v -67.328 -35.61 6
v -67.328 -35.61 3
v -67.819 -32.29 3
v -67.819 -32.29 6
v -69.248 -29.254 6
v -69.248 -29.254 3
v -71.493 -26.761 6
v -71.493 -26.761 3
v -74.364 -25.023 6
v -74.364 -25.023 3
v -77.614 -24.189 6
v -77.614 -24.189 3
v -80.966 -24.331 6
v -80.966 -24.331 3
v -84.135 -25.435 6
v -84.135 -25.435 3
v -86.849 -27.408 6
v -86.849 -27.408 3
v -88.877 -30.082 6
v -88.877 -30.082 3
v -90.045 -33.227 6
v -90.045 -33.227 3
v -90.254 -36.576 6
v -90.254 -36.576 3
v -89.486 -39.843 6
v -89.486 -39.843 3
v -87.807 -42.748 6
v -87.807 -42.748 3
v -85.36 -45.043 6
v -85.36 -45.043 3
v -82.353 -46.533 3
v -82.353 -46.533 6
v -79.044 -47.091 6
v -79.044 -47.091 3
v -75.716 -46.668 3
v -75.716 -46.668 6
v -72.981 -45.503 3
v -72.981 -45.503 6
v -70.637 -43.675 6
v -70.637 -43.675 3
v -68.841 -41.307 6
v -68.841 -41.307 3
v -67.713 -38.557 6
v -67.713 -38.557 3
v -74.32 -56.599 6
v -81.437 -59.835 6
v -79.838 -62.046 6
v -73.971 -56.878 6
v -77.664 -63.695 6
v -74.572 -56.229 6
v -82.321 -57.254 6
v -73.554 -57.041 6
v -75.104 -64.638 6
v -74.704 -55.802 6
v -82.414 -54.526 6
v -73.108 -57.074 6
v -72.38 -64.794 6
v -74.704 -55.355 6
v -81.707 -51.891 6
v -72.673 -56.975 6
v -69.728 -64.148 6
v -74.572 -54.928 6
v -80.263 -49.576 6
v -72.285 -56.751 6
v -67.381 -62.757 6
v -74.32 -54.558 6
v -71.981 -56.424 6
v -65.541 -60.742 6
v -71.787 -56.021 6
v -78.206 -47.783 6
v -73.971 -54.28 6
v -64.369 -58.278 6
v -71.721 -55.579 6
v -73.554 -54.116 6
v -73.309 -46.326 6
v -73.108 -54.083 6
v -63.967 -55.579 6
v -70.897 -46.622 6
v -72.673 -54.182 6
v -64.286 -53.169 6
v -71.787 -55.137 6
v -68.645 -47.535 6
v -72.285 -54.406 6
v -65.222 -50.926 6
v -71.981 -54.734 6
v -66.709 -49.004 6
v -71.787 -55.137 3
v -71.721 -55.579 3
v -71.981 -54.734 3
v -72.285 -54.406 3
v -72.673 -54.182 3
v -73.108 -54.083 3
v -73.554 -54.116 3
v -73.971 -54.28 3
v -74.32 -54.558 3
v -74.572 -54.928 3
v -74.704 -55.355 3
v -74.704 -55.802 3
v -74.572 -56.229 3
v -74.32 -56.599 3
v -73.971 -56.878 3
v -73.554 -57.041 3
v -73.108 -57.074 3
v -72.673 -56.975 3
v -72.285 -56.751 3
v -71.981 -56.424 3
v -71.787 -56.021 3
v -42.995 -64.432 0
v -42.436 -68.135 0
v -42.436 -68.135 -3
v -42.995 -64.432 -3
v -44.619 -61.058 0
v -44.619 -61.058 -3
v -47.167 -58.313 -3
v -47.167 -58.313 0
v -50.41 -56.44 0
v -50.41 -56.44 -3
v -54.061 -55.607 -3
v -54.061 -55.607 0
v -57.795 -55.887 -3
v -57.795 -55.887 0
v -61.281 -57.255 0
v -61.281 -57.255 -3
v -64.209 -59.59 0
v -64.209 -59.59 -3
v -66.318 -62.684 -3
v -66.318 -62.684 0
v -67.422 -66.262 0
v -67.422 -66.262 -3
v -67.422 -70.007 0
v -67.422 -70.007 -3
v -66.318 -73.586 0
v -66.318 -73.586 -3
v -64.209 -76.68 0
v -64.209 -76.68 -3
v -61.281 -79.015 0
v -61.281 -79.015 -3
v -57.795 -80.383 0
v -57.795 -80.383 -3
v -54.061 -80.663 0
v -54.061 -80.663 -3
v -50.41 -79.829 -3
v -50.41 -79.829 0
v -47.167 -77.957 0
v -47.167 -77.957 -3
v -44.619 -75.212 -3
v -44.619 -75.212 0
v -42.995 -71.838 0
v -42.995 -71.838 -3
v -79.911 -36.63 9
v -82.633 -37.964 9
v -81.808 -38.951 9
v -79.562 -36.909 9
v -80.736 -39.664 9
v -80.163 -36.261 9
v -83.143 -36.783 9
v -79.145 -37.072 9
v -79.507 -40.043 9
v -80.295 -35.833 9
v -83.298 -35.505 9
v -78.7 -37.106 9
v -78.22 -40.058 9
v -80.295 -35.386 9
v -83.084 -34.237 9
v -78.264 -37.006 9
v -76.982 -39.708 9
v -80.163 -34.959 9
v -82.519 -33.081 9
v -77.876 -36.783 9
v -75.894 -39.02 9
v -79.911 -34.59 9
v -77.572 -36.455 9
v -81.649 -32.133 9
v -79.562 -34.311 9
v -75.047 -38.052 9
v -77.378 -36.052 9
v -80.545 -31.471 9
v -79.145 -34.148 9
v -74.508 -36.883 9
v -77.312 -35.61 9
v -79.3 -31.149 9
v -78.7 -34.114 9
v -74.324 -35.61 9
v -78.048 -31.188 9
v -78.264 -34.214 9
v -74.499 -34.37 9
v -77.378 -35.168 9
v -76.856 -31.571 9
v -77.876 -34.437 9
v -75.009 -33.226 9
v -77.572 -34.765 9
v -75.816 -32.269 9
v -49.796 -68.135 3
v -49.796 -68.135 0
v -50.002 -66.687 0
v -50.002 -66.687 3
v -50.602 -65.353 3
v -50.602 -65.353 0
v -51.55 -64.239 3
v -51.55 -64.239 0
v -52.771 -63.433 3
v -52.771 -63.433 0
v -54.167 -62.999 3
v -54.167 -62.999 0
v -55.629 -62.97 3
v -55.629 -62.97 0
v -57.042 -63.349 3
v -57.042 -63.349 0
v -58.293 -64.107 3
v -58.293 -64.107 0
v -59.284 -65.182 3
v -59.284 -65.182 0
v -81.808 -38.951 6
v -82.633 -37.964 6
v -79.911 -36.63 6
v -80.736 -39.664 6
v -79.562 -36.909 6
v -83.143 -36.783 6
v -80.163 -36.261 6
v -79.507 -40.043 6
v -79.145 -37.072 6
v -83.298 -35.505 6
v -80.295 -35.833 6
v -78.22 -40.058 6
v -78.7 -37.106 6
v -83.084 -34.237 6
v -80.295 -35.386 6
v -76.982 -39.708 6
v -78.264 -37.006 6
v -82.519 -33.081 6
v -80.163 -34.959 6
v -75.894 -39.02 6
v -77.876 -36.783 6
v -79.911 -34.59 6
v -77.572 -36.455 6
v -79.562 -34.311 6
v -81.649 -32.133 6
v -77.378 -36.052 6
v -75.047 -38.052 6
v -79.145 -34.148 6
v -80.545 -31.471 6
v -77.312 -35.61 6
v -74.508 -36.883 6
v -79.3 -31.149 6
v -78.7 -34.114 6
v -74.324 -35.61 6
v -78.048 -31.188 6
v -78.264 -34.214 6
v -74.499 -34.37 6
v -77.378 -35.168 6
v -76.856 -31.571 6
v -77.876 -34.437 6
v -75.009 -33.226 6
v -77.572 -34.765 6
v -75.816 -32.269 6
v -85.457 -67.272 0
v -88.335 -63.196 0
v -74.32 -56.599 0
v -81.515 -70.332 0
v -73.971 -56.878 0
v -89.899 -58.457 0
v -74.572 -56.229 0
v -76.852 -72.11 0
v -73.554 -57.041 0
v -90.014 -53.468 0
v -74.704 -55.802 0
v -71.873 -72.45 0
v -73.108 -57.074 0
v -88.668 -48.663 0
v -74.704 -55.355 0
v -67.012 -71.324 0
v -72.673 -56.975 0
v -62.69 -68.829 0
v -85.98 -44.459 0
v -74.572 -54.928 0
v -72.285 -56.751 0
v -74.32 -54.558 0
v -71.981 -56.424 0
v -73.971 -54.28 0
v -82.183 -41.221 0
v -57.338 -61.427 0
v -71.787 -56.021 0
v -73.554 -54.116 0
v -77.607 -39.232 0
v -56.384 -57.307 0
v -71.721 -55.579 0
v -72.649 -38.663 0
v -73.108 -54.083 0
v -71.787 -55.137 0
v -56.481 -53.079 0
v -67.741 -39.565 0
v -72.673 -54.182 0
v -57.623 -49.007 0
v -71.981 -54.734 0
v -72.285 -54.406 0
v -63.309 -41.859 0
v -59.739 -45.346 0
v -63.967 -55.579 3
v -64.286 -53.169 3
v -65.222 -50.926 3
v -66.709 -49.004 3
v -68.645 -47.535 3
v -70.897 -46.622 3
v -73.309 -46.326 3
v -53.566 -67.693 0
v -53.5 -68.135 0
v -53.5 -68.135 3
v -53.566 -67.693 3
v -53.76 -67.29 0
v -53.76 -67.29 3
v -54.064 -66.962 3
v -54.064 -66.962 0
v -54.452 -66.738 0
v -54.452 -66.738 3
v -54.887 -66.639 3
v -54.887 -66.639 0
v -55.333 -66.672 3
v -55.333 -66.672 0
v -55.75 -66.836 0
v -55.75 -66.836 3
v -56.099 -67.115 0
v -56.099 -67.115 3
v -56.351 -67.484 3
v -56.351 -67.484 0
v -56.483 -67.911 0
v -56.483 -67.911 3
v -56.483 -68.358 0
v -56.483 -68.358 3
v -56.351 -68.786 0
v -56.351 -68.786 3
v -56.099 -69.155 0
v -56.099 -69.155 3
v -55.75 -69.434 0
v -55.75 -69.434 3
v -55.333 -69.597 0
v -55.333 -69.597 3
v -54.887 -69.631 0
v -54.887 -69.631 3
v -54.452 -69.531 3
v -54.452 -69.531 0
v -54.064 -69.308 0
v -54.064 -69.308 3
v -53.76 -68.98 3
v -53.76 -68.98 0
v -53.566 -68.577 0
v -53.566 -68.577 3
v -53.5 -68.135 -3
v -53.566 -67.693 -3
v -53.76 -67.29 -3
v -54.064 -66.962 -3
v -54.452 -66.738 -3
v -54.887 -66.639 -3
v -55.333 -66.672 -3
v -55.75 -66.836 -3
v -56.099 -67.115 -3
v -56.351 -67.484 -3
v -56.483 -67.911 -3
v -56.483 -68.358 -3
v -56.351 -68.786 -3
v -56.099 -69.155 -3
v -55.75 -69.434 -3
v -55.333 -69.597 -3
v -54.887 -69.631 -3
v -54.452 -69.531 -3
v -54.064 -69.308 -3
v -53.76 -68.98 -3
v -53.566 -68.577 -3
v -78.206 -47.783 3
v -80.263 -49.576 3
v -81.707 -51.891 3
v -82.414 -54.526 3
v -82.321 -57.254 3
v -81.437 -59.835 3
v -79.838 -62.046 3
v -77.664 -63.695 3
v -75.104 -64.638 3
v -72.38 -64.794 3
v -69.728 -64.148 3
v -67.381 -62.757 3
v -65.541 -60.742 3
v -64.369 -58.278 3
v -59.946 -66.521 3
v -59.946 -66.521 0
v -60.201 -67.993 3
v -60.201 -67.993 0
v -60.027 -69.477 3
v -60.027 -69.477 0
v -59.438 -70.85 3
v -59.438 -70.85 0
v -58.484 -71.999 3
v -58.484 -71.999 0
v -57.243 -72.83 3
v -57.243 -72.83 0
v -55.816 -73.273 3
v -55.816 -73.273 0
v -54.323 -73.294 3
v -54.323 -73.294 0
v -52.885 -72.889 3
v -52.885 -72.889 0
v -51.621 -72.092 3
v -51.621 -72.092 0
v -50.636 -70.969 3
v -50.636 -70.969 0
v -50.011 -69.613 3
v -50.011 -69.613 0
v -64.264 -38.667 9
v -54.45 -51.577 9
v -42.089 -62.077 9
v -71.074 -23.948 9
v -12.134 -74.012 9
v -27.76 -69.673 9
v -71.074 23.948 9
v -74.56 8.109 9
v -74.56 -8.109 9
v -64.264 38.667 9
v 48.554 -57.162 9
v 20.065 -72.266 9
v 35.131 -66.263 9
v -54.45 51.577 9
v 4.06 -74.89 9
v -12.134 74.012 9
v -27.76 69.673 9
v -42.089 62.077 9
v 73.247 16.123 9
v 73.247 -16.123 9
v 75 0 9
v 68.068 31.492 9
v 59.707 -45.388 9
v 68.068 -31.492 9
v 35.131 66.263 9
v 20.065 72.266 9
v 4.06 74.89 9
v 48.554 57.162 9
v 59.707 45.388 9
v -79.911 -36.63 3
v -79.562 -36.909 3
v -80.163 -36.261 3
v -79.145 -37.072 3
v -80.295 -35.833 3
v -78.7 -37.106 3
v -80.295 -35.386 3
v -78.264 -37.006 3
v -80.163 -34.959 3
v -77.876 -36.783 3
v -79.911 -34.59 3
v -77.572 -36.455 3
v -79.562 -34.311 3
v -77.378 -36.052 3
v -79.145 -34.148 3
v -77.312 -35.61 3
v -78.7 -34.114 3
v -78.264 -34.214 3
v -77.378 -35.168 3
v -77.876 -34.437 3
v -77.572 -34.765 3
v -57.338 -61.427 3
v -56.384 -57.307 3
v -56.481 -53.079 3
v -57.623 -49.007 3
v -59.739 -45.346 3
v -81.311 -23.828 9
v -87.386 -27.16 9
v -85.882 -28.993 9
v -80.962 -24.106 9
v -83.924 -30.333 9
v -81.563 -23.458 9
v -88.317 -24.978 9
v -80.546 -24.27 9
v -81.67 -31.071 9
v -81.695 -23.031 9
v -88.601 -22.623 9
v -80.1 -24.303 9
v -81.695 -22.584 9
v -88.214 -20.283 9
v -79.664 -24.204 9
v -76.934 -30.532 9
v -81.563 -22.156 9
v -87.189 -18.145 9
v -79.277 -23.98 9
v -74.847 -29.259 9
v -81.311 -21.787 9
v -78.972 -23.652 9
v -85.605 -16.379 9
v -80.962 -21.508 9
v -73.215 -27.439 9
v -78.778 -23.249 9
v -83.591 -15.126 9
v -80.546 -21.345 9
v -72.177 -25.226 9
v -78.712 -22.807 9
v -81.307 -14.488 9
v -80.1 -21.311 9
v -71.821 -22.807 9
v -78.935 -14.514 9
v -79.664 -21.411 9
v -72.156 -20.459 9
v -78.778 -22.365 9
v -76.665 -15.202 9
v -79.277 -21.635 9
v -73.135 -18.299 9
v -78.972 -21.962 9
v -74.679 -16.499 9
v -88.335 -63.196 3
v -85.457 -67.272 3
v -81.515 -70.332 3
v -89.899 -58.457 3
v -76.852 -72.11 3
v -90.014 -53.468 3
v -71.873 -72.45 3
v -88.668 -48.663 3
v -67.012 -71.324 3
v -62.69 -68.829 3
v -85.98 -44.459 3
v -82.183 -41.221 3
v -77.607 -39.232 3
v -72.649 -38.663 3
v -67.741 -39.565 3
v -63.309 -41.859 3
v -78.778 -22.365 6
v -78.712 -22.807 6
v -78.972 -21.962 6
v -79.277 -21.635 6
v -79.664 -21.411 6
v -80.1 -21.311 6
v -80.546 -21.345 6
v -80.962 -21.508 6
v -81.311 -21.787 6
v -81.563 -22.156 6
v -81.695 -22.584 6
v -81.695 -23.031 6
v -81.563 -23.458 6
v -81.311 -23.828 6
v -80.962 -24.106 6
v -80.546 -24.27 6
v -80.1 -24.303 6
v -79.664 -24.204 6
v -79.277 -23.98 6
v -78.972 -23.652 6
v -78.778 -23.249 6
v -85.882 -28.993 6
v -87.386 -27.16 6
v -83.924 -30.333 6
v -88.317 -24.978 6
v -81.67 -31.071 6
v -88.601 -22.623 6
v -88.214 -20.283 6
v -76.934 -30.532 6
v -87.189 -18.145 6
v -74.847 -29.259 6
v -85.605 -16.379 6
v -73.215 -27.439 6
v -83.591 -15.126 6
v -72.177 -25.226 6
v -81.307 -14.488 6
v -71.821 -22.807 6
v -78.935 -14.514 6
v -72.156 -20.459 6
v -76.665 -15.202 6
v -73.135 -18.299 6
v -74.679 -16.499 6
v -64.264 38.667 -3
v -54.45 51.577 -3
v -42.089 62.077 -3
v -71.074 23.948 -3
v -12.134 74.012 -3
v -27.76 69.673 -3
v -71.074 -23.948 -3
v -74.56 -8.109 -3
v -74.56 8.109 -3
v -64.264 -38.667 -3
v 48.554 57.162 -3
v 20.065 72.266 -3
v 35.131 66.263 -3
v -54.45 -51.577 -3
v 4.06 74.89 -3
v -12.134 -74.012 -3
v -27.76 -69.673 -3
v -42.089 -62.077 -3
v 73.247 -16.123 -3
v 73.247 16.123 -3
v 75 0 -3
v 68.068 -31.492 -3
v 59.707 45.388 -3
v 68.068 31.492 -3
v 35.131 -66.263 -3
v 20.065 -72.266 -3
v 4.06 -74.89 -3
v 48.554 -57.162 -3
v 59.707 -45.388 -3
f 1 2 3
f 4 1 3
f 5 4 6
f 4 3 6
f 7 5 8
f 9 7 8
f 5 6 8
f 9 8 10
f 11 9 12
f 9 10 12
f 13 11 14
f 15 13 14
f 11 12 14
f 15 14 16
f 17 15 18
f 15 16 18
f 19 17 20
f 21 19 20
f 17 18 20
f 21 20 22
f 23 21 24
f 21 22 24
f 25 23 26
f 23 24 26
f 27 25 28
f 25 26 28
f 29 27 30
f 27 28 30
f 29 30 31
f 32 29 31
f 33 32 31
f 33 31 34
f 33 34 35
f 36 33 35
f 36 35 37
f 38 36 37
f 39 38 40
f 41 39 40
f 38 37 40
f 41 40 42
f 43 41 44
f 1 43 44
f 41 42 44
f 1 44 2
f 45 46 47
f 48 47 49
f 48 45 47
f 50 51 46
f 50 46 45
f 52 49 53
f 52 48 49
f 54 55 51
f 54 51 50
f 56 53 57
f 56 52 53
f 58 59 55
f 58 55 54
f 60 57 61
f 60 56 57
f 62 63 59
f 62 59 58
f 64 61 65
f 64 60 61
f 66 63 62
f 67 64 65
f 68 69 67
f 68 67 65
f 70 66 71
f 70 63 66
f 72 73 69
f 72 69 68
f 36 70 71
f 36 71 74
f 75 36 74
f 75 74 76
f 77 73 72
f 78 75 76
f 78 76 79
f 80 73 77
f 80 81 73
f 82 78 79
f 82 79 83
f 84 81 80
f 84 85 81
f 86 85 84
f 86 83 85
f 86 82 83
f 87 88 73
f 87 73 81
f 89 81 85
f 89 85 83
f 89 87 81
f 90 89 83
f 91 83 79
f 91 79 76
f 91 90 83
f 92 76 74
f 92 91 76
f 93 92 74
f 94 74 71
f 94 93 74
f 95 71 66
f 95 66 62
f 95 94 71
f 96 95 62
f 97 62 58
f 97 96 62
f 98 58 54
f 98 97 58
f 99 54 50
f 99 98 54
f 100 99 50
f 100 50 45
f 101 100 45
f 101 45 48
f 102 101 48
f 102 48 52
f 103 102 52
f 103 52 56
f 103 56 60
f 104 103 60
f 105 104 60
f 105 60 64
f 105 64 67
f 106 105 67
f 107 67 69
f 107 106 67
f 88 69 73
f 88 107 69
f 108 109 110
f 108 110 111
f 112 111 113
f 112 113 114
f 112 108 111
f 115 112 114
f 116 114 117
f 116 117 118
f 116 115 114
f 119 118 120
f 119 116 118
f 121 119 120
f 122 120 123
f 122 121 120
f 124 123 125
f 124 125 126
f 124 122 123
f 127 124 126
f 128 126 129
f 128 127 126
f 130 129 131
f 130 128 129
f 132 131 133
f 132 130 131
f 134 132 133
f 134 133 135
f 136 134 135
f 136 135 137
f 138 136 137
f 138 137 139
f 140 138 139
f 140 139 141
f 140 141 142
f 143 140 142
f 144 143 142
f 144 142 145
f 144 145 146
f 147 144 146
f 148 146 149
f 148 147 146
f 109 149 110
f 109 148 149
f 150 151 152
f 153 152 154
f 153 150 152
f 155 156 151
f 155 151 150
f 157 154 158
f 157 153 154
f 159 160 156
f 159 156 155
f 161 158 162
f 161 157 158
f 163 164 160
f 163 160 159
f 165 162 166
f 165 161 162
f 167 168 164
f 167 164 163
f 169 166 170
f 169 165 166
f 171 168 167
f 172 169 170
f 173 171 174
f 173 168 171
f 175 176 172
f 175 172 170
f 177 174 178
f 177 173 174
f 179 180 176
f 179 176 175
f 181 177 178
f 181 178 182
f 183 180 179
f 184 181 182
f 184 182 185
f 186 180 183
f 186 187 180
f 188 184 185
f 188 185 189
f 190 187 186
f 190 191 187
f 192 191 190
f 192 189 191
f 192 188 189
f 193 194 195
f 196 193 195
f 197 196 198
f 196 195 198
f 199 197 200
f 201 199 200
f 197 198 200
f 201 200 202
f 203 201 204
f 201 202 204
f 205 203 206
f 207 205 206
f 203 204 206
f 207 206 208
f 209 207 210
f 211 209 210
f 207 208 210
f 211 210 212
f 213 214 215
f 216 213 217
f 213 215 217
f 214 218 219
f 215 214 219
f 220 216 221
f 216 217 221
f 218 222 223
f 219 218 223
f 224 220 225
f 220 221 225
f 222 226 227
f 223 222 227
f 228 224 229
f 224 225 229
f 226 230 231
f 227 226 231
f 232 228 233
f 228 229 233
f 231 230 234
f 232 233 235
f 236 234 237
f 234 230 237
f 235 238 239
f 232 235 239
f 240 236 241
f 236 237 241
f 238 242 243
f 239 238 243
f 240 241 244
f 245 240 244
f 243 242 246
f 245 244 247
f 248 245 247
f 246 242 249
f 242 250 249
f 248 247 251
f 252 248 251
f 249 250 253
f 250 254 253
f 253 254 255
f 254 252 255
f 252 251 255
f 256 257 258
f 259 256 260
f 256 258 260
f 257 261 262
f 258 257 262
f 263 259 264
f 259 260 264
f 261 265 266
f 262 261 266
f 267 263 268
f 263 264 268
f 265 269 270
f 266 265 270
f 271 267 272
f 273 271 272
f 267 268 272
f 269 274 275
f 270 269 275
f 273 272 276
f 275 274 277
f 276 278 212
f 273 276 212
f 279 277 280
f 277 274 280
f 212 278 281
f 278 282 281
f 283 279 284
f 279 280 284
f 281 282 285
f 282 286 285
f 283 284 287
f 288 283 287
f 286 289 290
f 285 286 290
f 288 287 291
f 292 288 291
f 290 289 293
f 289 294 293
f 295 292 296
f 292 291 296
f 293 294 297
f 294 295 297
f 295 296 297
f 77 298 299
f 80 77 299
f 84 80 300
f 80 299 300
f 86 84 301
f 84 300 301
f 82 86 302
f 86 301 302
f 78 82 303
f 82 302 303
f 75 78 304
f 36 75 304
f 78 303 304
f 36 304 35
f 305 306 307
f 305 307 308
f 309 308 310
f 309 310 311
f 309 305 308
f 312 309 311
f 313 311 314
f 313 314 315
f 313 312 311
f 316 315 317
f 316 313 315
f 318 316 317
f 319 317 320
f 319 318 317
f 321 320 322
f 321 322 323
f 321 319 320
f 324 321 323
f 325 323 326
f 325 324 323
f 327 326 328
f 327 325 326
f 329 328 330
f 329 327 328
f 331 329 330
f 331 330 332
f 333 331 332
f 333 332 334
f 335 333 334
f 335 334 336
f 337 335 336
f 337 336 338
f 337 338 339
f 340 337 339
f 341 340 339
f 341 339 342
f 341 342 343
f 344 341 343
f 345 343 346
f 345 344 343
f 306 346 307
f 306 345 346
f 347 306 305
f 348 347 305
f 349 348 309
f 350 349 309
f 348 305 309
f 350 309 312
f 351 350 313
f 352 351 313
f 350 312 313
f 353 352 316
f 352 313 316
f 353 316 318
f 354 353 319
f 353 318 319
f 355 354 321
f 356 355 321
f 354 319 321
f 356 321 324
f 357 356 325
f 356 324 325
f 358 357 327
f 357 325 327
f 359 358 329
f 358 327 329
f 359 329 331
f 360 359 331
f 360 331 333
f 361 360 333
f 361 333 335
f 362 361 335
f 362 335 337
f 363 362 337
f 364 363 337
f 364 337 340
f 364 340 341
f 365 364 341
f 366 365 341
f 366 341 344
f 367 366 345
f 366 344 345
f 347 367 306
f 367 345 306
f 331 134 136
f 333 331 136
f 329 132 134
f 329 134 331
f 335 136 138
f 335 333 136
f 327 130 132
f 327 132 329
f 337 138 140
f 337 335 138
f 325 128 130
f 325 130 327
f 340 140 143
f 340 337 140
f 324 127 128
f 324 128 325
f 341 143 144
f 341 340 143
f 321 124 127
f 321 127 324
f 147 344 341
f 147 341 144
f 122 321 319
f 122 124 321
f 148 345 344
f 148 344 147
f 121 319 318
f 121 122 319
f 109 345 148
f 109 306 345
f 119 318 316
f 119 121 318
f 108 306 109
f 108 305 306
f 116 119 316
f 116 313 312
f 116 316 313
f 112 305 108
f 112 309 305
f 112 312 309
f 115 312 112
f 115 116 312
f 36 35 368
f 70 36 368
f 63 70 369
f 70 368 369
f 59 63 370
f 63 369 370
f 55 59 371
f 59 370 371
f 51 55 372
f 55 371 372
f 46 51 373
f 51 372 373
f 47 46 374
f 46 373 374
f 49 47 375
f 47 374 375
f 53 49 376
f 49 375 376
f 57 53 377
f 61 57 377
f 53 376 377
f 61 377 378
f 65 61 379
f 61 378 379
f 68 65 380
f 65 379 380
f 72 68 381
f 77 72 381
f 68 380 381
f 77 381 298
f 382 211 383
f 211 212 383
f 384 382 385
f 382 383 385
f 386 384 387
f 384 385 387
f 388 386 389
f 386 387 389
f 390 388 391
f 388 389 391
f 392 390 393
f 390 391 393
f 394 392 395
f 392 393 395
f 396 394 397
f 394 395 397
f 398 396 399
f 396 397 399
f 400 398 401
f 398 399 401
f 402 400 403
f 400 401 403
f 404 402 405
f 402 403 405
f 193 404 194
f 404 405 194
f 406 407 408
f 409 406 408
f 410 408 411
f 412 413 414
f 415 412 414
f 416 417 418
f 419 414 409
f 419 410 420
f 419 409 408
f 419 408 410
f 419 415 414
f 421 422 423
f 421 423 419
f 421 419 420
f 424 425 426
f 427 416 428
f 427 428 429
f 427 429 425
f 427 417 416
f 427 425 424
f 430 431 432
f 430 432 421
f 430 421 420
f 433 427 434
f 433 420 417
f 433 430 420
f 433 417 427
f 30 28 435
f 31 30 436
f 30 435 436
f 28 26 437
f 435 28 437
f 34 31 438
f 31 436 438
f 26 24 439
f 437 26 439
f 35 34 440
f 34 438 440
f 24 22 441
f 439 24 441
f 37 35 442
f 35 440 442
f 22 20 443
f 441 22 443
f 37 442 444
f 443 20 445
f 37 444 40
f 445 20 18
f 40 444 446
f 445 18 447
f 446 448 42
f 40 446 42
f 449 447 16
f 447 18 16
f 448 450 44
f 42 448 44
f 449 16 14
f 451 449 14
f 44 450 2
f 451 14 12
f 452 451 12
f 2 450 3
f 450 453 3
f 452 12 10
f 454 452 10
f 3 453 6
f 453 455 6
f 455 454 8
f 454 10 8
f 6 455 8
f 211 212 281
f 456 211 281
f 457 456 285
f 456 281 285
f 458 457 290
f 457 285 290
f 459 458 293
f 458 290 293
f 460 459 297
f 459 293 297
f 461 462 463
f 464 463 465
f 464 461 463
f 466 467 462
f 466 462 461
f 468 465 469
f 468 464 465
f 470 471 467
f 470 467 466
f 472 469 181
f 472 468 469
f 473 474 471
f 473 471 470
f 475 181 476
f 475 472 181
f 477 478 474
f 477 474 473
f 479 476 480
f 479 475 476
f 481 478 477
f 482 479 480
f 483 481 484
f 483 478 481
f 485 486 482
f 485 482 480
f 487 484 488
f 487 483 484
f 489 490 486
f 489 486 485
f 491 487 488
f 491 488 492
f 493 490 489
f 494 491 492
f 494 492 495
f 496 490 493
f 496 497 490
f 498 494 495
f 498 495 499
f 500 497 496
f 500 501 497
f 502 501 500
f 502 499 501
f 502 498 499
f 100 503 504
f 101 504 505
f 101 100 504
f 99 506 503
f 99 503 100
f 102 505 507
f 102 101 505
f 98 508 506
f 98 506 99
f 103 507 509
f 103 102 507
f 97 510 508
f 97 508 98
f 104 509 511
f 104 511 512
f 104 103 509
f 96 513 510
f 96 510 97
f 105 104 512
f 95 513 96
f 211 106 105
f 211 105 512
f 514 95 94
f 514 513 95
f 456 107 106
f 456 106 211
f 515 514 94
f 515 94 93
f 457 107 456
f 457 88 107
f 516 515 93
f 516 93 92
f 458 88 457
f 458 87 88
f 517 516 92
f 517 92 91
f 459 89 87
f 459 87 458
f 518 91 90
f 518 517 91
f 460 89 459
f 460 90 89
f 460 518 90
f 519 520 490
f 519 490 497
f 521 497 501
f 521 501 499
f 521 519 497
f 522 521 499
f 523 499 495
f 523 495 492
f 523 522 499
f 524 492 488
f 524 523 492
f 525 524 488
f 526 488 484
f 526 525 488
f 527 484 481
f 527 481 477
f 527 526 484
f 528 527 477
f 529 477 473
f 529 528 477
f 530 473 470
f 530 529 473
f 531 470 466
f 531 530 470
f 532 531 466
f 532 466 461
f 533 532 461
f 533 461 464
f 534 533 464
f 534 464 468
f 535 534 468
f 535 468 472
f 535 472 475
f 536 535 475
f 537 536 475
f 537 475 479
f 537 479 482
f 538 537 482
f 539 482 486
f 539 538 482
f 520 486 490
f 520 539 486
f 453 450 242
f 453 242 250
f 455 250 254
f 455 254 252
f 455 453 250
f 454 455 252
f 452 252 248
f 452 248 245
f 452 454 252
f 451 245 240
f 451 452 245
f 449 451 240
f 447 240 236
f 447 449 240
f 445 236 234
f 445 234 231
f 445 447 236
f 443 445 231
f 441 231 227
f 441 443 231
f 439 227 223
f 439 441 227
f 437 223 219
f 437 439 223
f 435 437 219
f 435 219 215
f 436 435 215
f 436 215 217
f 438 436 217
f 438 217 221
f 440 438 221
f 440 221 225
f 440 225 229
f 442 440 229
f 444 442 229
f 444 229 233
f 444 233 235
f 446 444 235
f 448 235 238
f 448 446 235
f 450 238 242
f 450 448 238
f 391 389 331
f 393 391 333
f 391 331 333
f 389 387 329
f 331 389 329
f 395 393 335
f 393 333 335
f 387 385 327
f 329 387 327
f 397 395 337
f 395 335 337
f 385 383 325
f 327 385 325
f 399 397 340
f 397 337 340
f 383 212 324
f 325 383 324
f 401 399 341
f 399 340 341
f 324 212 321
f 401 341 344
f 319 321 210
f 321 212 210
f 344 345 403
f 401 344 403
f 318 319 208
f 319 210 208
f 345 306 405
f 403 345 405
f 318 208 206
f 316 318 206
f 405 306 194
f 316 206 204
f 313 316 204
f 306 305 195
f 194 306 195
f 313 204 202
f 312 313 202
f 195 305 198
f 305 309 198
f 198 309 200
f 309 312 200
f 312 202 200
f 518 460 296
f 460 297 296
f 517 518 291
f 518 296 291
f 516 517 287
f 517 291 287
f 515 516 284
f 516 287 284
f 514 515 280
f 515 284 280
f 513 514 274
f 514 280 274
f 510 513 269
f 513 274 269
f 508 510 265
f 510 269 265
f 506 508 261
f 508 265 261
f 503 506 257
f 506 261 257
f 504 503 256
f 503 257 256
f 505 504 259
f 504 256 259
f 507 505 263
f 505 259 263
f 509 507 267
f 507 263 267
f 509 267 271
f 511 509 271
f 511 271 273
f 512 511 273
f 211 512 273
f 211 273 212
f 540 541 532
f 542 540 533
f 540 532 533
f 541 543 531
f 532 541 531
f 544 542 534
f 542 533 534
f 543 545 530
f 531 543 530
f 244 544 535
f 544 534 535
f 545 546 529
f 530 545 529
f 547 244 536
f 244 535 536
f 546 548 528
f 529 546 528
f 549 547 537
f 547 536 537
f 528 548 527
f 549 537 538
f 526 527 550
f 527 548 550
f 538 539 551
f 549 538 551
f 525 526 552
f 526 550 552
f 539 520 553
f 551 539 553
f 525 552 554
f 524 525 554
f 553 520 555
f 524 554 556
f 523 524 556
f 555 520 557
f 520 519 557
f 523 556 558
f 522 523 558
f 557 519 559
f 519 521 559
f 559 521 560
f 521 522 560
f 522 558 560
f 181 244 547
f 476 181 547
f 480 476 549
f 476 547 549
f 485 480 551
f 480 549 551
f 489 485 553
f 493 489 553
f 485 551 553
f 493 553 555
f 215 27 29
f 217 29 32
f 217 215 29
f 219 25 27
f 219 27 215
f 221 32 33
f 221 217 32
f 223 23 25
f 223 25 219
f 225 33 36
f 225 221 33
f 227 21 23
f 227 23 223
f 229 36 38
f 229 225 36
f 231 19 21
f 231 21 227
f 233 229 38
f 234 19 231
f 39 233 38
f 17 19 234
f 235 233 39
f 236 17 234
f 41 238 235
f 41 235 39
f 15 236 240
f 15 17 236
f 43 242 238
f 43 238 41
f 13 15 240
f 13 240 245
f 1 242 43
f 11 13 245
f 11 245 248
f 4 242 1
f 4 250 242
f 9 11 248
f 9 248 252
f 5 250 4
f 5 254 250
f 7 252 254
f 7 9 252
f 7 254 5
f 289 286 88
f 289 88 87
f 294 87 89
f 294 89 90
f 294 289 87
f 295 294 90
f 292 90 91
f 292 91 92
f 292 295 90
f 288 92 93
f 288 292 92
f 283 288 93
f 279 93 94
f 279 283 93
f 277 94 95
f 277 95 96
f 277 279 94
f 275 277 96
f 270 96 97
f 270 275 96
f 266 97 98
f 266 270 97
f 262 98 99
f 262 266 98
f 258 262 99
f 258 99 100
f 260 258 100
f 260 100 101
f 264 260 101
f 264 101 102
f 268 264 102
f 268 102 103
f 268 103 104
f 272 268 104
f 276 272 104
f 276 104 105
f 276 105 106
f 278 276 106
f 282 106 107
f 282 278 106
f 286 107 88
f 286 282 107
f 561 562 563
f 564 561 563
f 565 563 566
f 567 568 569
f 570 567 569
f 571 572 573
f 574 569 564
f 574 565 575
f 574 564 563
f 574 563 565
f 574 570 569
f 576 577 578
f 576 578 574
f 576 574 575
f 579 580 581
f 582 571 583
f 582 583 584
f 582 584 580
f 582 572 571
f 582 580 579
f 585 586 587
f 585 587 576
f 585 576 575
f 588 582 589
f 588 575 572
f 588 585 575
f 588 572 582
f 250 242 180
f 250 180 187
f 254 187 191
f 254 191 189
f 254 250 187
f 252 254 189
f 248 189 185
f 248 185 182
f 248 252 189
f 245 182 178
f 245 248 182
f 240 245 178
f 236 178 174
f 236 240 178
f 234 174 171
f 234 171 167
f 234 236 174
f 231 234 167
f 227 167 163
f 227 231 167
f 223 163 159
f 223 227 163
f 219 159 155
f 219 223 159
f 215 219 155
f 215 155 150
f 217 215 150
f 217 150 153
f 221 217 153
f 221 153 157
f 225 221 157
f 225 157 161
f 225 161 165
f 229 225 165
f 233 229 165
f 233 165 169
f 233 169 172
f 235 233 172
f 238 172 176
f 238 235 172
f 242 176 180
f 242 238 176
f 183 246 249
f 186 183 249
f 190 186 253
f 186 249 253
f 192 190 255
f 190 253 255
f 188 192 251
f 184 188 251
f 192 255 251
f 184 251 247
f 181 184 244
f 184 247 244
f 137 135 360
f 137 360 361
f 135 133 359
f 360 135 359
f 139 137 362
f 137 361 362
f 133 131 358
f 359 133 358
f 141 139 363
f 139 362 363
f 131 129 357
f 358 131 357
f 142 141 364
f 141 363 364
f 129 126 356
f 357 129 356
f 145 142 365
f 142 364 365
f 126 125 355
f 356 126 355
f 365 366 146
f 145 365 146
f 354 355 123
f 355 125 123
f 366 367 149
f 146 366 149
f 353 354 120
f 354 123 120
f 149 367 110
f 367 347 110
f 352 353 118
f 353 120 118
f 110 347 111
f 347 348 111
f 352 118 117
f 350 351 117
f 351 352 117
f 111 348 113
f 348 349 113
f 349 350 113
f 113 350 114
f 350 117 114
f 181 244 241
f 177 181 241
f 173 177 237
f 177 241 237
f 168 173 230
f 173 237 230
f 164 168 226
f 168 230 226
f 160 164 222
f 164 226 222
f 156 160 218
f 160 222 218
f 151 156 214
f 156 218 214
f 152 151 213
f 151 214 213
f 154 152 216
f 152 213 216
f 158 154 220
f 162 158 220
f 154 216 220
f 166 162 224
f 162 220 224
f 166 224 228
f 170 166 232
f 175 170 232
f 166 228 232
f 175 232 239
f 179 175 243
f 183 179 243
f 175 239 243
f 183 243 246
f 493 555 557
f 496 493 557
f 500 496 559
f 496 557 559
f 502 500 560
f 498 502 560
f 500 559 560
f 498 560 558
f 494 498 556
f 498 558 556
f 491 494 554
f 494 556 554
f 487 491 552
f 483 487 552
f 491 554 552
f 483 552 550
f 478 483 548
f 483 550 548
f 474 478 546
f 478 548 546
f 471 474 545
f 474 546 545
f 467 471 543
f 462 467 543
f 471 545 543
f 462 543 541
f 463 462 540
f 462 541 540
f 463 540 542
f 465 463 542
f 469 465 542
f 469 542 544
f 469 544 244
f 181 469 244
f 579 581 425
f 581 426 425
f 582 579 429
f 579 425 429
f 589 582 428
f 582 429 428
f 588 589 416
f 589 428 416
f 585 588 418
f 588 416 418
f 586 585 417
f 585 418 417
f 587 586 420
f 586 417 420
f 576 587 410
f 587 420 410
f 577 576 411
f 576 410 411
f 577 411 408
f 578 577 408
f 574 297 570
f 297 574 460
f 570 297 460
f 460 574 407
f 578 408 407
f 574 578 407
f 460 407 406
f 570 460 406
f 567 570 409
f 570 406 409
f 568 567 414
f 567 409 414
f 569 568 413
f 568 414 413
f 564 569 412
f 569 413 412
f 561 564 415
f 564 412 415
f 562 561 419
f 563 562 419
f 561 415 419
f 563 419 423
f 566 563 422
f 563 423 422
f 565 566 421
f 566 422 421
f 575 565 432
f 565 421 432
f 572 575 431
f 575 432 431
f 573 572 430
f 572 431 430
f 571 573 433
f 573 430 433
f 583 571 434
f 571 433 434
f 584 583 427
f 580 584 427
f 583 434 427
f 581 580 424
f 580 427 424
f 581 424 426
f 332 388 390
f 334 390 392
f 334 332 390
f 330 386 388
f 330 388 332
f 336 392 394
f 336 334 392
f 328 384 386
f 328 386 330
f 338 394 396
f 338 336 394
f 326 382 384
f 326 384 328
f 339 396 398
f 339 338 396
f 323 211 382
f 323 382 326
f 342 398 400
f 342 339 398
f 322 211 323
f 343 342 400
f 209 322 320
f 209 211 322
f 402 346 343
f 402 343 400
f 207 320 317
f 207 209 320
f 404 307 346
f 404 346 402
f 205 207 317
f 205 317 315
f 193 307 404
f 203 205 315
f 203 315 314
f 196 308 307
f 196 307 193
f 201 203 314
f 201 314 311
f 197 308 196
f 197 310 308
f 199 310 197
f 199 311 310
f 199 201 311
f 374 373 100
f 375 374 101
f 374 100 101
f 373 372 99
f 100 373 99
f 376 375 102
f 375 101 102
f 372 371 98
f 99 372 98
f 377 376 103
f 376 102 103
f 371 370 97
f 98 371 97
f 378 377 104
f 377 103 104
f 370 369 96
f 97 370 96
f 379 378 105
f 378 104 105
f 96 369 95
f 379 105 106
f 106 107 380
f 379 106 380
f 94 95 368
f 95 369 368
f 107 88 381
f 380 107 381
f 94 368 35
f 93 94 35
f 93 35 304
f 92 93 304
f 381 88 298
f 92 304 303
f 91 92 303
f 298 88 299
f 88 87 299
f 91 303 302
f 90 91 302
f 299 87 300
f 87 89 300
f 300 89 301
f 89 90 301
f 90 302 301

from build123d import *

# Parameters (mm, degrees)
F0_R      = 75
F1_DEPTH  = 9
F2_R      = 16.9251457535
F2_R_2    = 1.5
F3_DEPTH  = 3
F4_R      = 1.5
F5_DEPTH  = 3
F6_R      = 1.5
F7_DEPTH  = 3
F8_R      = 75
F9_DEPTH  = 3
F10_R     = 5.20314003
F10_R_2   = 1.5
F11_DEPTH = 3
F12_R     = 12.5630950787
F12_R_2   = 1.5
F13_DEPTH = 3


with BuildPart() as f1:
    # F0 (on Top) → F1 (new body)
    with BuildSketch(Plane.XY):
        Circle(F0_R)
    extrude(amount=F1_DEPTH)

    # F2 (on Top) → F3 (join)
    with BuildSketch(Plane.XY):
        with Locations((-73.2205287294, -55.5786523261)):
            Circle(F2_R)
        with Locations((-73.2205287294, -55.5786523261)):
            Circle(F2_R_2, mode=Mode.SUBTRACT)
    extrude(amount=F3_DEPTH)

    # F8 (on face) → F9 (join)
    with BuildSketch(Plane(origin=(0, 0, 0), x_dir=(1, 0, 0), z_dir=(0, 0, -1))):
        Circle(F8_R)
    extrude(amount=F9_DEPTH)

    # F10 (on Top) → F11 (join)
    with BuildSketch(Plane.XY):
        with Locations((-54.9995288447, -68.1347741364)):
            Circle(F10_R)
        with Locations((-54.9995288447, -68.1347741364)):
            Circle(F10_R_2, mode=Mode.SUBTRACT)
    extrude(amount=F11_DEPTH)


with BuildPart() as f5:
    # F4 (on face) → F5 (new body)
    with BuildSketch(Plane.XY.offset(3)):
        with BuildLine():
            ThreePointArc((-75.7155200416, -46.6678433327), (-78.8124901295, -62.9514039335), (-63.9670159605, -55.5786523261))
            ThreePointArc((-63.9670159605, -55.5786523261), (-67.6285673294, -48.2059007187), (-75.7155200416, -46.6678433327))
        make_face()
        with Locations((-73.2205287294, -55.5786523261)):
            Circle(F4_R, mode=Mode.SUBTRACT)
    extrude(amount=F5_DEPTH)


with BuildPart() as f5b:
    # F4 (on face) → F5, piece 2 (new body)
    with BuildSketch(Plane.XY.offset(3)):
        with BuildLine():
            ThreePointArc((-67.3284730942, -35.6098939539), (-87.9609886893, -28.6704991503), (-75.7155200416, -46.6678433327))
            ThreePointArc((-75.7155200416, -46.6678433327), (-69.6624202088, -42.5492887575), (-67.3284730942, -35.6098939539))
        make_face()
        with Locations((-78.8117044491, -35.6098939539)):
            Circle(F4_R, mode=Mode.SUBTRACT)
    extrude(amount=F5_DEPTH)


with BuildPart() as f7:
    # F6 (on face) → F7 (new body)
    with BuildSketch(Plane.XY.offset(6)):
        with BuildLine():
            ThreePointArc((-79.2995726934, -31.1487937614), (-81.8075369853, -38.9512137181), (-74.324006782, -35.6098939539))
            ThreePointArc((-74.324006782, -35.6098939539), (-75.8158719129, -32.2685741897), (-79.2995726934, -31.1487937614))
        make_face()
        with Locations((-78.8117044491, -35.6098939539)):
            Circle(F6_R, mode=Mode.SUBTRACT)
    extrude(amount=F7_DEPTH)


with BuildPart() as f7b:
    # F6 (on face) → F7, piece 2 (new body)
    with BuildSketch(Plane.XY.offset(6)):
        with BuildLine():
            ThreePointArc((-71.8205325584, -22.8072506442), (-86.4595419823, -17.2055236133), (-79.2995726934, -31.1487937614))
            ThreePointArc((-79.2995726934, -31.1487937614), (-73.9640755278, -28.4089776752), (-71.8205325584, -22.8072506442))
        make_face()
        with Locations((-80.211808755, -22.8072506442)):
            Circle(F6_R, mode=Mode.SUBTRACT)
    extrude(amount=F7_DEPTH)


with BuildPart() as f13:
    # F12 (on Top) → F13 (new body)
    with BuildSketch(Plane.XY):
        with Locations((-54.9995288447, -68.1347741364)):
            Circle(F12_R)
        with Locations((-54.9995288447, -68.1347741364)):
            Circle(F12_R_2, mode=Mode.SUBTRACT)
    extrude(amount=-F13_DEPTH)


solid = Compound([f1.part, f5.part, f5b.part, f7.part, f7b.part, f13.part])
